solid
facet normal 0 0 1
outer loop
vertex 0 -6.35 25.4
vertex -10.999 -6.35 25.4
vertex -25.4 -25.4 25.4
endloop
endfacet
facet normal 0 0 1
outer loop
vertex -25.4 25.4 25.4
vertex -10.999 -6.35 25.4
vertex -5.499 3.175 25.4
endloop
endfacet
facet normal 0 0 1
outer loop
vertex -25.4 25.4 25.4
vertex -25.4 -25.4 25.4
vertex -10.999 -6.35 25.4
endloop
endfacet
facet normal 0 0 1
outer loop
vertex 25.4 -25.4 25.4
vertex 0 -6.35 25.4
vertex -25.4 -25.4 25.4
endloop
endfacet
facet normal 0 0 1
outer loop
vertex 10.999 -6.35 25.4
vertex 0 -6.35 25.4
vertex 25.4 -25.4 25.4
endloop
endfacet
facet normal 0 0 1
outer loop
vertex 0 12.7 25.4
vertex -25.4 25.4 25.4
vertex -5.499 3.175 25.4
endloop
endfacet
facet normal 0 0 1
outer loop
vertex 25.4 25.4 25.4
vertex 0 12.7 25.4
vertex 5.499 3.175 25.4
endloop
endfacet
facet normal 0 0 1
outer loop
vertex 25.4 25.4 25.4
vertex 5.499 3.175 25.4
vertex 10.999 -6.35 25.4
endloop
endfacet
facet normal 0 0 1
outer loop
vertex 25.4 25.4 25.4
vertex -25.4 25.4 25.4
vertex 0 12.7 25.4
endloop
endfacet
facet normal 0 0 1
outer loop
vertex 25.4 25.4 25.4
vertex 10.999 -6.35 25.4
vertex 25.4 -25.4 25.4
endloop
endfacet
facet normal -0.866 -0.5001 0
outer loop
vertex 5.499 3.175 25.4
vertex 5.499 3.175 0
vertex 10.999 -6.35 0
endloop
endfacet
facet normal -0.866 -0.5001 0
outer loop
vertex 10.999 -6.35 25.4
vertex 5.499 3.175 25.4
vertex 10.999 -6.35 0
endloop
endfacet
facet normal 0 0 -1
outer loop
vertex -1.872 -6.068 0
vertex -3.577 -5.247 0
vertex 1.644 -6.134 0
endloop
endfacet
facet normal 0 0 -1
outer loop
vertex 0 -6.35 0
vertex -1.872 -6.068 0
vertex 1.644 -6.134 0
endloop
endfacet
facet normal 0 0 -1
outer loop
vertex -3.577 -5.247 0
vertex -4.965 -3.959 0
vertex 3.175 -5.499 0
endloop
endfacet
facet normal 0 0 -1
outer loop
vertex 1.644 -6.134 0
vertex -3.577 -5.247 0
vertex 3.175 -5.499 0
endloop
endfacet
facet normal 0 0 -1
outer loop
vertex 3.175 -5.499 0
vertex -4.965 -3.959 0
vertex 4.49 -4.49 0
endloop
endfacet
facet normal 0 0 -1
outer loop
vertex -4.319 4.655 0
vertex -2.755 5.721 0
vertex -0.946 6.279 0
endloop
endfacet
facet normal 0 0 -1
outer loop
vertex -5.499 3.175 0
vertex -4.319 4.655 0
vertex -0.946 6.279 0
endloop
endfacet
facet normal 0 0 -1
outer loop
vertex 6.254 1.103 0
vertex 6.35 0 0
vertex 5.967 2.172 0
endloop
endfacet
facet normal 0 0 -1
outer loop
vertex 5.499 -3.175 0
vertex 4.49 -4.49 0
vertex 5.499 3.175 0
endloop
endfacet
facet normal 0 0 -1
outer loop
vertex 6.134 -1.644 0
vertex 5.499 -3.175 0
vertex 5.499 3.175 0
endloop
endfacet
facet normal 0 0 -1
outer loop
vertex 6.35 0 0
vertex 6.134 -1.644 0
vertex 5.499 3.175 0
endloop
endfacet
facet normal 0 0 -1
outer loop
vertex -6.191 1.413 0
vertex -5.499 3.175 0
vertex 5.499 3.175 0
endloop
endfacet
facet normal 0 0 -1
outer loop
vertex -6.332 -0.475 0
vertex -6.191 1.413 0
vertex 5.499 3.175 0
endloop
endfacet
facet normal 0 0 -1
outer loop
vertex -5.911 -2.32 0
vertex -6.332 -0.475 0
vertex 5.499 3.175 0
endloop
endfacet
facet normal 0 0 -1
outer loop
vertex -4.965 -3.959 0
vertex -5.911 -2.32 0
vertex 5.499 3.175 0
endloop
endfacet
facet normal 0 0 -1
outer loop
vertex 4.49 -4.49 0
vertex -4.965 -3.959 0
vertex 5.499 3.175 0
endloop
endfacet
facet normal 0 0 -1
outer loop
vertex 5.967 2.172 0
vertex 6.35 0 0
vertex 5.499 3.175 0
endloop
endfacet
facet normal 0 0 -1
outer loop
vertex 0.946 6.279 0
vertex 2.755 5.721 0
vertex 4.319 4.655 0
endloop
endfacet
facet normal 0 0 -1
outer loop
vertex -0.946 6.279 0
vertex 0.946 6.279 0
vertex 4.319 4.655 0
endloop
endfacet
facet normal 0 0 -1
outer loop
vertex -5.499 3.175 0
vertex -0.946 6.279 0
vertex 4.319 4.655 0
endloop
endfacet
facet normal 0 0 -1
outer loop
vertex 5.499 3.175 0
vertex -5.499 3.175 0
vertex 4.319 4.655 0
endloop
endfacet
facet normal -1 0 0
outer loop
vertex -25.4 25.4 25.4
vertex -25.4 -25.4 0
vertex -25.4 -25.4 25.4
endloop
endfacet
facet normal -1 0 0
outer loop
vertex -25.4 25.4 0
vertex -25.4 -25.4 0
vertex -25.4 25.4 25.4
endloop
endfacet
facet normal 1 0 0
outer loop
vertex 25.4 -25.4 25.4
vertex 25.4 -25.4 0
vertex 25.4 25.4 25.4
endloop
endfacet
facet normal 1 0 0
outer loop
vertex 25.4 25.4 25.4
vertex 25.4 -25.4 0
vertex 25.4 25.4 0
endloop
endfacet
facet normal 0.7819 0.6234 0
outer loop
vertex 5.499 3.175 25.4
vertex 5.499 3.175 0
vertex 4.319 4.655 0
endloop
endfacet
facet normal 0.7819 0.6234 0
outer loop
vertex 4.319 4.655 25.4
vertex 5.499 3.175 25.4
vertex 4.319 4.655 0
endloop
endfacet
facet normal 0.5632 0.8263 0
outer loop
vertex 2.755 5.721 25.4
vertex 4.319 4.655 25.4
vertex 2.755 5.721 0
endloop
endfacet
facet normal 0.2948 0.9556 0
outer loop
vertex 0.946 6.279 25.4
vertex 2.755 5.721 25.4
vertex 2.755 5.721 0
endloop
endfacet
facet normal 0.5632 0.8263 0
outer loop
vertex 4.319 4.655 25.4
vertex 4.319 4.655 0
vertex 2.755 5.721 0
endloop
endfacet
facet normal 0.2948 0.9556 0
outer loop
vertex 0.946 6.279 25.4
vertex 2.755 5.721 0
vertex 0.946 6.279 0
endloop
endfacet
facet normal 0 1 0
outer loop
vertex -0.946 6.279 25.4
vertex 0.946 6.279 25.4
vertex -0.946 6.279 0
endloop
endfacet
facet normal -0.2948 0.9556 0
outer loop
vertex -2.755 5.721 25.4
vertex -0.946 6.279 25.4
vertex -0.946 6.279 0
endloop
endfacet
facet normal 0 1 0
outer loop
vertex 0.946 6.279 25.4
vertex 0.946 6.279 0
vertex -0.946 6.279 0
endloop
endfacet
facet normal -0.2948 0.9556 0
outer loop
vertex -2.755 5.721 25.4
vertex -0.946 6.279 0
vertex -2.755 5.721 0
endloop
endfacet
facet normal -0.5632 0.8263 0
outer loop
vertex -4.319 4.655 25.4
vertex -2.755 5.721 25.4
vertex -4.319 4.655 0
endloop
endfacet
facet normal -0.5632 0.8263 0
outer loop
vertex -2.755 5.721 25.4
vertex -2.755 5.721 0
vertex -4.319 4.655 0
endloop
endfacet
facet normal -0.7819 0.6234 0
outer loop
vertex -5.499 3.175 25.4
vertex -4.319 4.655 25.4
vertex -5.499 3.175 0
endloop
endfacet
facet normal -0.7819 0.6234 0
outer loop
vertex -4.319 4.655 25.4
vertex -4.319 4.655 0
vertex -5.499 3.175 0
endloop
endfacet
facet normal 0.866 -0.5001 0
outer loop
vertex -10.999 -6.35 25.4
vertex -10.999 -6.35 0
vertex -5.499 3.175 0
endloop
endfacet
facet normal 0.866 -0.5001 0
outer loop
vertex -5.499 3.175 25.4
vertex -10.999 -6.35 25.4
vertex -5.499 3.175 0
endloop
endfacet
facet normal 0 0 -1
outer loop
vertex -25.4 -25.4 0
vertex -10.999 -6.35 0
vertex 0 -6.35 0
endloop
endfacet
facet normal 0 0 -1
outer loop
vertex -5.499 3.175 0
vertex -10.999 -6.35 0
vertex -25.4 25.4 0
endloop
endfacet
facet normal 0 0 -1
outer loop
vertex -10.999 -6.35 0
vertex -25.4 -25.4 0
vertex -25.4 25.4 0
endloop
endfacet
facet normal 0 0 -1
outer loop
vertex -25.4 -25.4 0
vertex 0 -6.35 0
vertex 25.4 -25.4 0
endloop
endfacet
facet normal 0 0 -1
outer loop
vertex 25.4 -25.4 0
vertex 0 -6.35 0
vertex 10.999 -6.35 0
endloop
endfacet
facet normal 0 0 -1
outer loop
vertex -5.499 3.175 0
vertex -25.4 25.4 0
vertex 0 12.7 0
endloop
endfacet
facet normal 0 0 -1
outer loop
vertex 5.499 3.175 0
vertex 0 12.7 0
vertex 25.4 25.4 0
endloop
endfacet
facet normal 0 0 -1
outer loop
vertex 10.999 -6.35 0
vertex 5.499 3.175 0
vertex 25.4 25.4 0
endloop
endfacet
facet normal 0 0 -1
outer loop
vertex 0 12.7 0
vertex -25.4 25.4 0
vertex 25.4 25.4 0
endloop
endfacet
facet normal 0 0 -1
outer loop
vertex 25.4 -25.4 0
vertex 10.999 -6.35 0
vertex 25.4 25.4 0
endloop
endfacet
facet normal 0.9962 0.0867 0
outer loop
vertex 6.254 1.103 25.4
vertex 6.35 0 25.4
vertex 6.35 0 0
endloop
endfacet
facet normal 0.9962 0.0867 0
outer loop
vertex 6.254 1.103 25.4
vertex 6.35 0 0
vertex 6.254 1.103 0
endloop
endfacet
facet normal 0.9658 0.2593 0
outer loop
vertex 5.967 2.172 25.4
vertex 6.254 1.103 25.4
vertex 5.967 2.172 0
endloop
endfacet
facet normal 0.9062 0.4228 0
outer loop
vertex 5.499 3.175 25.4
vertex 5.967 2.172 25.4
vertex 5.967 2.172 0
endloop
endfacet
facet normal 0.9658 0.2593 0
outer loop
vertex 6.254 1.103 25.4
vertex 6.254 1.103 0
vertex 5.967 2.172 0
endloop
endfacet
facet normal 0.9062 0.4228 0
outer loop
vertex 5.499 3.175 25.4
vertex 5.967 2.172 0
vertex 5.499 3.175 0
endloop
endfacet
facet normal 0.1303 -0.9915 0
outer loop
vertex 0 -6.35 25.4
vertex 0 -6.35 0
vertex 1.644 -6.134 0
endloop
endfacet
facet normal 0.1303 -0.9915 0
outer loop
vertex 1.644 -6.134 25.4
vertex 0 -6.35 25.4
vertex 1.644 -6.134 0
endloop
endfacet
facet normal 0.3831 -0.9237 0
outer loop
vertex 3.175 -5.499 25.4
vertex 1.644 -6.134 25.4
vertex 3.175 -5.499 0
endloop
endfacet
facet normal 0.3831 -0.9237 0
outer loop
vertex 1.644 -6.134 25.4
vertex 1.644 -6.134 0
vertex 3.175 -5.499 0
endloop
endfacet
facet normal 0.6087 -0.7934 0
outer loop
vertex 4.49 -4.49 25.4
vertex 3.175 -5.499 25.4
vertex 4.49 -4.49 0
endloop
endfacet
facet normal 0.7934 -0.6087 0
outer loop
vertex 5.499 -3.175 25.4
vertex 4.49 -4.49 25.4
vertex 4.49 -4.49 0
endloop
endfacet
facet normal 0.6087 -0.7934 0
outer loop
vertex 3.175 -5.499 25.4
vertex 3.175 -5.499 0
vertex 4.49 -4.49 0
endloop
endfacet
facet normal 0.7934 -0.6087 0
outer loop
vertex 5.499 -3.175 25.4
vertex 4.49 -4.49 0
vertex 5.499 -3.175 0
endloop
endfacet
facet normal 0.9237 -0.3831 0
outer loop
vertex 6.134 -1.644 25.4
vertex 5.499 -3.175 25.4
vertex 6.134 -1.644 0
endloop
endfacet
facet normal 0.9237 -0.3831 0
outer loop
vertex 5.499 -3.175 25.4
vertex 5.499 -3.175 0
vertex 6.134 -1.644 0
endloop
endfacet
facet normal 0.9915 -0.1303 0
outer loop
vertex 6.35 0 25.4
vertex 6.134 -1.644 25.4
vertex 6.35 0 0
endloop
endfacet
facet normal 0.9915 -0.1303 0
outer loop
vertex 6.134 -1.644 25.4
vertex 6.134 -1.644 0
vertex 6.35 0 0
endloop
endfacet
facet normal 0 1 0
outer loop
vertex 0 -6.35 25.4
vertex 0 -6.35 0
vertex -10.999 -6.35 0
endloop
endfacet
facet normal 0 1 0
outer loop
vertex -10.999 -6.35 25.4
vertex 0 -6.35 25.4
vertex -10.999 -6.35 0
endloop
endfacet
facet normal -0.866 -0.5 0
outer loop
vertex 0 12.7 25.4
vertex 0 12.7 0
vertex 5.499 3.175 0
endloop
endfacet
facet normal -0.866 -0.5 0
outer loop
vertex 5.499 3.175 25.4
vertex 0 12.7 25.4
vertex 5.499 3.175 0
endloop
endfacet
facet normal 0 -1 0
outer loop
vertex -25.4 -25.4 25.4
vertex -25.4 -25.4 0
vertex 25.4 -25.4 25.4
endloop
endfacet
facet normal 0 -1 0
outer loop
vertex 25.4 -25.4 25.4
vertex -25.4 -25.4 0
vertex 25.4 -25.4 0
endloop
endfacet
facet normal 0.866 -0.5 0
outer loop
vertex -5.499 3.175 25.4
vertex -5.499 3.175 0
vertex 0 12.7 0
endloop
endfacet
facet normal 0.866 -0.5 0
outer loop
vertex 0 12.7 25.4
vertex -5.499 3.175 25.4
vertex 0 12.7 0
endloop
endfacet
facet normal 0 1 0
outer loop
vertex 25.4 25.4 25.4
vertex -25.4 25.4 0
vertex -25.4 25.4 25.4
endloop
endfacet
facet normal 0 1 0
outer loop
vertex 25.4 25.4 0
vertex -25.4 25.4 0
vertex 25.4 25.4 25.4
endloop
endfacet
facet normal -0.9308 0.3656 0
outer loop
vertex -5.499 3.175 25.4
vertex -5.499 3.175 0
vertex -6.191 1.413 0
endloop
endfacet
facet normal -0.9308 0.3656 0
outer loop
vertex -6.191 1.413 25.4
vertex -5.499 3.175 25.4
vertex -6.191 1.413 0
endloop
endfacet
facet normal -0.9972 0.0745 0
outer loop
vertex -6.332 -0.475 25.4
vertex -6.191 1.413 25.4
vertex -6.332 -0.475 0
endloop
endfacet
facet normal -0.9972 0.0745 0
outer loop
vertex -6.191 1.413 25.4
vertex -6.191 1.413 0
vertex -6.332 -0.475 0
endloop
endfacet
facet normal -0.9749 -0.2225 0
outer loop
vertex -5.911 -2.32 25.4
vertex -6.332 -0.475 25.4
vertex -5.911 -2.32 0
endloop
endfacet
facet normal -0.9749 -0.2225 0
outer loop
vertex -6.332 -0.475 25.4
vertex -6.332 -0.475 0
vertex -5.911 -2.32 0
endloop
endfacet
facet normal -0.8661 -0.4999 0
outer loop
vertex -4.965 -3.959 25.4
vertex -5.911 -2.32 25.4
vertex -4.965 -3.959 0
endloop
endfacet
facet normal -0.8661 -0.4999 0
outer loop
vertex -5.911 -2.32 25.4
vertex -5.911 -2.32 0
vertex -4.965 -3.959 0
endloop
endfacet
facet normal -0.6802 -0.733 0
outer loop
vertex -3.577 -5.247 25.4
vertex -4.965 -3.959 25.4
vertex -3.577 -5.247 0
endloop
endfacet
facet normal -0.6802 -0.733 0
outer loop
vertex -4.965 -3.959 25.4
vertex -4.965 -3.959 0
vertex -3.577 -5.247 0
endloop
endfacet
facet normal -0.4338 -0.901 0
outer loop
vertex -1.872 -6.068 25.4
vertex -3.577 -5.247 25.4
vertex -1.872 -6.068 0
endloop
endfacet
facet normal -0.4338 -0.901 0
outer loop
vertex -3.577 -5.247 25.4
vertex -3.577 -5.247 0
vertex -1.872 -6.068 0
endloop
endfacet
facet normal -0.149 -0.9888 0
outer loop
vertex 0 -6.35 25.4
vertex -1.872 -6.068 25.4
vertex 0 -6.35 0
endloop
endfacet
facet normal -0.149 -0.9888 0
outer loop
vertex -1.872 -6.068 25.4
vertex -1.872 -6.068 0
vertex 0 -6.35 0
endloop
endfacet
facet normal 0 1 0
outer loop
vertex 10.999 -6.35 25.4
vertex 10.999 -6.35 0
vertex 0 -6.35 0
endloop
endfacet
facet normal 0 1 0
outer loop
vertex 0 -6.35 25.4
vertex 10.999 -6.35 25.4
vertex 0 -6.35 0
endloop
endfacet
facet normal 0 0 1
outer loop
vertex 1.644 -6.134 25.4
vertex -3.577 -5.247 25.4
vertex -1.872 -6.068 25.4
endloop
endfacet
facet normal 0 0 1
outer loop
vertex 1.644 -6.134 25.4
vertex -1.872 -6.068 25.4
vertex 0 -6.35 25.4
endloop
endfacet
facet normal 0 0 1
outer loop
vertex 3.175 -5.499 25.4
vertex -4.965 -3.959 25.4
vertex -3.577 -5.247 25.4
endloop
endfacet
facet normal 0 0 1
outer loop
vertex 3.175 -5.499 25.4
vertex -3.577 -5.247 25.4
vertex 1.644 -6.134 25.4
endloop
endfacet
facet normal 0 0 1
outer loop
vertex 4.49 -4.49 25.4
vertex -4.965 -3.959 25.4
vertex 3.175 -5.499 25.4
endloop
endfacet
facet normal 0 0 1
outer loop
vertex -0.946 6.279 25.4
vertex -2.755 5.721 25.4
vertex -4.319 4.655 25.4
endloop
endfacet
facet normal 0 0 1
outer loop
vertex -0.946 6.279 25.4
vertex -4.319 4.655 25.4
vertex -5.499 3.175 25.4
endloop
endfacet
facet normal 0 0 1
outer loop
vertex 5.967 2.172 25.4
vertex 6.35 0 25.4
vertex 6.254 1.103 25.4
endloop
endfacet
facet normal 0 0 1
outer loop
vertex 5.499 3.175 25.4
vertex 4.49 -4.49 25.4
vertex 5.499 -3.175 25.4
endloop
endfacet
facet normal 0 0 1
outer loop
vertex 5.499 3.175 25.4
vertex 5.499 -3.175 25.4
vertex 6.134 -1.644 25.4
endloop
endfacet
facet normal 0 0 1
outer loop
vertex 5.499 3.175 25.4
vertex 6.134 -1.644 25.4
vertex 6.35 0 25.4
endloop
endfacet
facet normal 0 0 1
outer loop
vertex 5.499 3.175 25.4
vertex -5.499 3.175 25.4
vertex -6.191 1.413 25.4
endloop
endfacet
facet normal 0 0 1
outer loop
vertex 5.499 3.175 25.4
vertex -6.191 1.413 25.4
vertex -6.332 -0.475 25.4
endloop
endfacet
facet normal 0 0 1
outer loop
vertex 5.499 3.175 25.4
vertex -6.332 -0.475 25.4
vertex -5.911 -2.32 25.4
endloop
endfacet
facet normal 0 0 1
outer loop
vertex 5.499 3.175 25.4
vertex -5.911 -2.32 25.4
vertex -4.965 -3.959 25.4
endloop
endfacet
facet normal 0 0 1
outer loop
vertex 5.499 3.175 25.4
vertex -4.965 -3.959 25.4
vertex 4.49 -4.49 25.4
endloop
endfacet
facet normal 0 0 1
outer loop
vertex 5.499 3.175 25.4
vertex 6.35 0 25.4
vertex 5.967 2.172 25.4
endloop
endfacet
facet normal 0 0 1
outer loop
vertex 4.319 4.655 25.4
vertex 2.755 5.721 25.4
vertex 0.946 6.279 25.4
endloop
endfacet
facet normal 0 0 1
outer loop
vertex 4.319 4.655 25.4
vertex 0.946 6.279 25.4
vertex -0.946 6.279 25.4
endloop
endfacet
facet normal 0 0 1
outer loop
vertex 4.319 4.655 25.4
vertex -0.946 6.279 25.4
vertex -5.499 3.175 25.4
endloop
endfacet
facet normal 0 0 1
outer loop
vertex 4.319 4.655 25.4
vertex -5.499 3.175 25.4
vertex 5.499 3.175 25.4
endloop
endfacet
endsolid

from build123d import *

# Parameters (mm, degrees)
F0_W     = 50.8
F0_H     = 50.8
F1_DEPTH = 25.4


with BuildPart() as f1:
    # F0 (on Top) → F1 (new body)
    with BuildSketch(Plane.XY):
        Rectangle(F0_W, F0_H)
        Polygon((0, 12.7), (5.499261, 3.175), (10.998523, -6.35), (0, -6.35), (-10.998523, -6.35), (-5.499261, 3.175), align=None, mode=Mode.SUBTRACT)
        with BuildLine():
            ThreePointArc((0, -6.35), (4.490128, -4.490128), (6.35, 0))
            ThreePointArc((6.35, 0), (6.133629, 1.643501), (5.499261, 3.175))
            ThreePointArc((5.499261, 3.175), (0, 6.35), (-5.499261, 3.175))
            ThreePointArc((-5.499261, 3.175), (-5.499261, -3.175), (0, -6.35))
        make_face()
    extrude(amount=F1_DEPTH)


solid = f1.part
